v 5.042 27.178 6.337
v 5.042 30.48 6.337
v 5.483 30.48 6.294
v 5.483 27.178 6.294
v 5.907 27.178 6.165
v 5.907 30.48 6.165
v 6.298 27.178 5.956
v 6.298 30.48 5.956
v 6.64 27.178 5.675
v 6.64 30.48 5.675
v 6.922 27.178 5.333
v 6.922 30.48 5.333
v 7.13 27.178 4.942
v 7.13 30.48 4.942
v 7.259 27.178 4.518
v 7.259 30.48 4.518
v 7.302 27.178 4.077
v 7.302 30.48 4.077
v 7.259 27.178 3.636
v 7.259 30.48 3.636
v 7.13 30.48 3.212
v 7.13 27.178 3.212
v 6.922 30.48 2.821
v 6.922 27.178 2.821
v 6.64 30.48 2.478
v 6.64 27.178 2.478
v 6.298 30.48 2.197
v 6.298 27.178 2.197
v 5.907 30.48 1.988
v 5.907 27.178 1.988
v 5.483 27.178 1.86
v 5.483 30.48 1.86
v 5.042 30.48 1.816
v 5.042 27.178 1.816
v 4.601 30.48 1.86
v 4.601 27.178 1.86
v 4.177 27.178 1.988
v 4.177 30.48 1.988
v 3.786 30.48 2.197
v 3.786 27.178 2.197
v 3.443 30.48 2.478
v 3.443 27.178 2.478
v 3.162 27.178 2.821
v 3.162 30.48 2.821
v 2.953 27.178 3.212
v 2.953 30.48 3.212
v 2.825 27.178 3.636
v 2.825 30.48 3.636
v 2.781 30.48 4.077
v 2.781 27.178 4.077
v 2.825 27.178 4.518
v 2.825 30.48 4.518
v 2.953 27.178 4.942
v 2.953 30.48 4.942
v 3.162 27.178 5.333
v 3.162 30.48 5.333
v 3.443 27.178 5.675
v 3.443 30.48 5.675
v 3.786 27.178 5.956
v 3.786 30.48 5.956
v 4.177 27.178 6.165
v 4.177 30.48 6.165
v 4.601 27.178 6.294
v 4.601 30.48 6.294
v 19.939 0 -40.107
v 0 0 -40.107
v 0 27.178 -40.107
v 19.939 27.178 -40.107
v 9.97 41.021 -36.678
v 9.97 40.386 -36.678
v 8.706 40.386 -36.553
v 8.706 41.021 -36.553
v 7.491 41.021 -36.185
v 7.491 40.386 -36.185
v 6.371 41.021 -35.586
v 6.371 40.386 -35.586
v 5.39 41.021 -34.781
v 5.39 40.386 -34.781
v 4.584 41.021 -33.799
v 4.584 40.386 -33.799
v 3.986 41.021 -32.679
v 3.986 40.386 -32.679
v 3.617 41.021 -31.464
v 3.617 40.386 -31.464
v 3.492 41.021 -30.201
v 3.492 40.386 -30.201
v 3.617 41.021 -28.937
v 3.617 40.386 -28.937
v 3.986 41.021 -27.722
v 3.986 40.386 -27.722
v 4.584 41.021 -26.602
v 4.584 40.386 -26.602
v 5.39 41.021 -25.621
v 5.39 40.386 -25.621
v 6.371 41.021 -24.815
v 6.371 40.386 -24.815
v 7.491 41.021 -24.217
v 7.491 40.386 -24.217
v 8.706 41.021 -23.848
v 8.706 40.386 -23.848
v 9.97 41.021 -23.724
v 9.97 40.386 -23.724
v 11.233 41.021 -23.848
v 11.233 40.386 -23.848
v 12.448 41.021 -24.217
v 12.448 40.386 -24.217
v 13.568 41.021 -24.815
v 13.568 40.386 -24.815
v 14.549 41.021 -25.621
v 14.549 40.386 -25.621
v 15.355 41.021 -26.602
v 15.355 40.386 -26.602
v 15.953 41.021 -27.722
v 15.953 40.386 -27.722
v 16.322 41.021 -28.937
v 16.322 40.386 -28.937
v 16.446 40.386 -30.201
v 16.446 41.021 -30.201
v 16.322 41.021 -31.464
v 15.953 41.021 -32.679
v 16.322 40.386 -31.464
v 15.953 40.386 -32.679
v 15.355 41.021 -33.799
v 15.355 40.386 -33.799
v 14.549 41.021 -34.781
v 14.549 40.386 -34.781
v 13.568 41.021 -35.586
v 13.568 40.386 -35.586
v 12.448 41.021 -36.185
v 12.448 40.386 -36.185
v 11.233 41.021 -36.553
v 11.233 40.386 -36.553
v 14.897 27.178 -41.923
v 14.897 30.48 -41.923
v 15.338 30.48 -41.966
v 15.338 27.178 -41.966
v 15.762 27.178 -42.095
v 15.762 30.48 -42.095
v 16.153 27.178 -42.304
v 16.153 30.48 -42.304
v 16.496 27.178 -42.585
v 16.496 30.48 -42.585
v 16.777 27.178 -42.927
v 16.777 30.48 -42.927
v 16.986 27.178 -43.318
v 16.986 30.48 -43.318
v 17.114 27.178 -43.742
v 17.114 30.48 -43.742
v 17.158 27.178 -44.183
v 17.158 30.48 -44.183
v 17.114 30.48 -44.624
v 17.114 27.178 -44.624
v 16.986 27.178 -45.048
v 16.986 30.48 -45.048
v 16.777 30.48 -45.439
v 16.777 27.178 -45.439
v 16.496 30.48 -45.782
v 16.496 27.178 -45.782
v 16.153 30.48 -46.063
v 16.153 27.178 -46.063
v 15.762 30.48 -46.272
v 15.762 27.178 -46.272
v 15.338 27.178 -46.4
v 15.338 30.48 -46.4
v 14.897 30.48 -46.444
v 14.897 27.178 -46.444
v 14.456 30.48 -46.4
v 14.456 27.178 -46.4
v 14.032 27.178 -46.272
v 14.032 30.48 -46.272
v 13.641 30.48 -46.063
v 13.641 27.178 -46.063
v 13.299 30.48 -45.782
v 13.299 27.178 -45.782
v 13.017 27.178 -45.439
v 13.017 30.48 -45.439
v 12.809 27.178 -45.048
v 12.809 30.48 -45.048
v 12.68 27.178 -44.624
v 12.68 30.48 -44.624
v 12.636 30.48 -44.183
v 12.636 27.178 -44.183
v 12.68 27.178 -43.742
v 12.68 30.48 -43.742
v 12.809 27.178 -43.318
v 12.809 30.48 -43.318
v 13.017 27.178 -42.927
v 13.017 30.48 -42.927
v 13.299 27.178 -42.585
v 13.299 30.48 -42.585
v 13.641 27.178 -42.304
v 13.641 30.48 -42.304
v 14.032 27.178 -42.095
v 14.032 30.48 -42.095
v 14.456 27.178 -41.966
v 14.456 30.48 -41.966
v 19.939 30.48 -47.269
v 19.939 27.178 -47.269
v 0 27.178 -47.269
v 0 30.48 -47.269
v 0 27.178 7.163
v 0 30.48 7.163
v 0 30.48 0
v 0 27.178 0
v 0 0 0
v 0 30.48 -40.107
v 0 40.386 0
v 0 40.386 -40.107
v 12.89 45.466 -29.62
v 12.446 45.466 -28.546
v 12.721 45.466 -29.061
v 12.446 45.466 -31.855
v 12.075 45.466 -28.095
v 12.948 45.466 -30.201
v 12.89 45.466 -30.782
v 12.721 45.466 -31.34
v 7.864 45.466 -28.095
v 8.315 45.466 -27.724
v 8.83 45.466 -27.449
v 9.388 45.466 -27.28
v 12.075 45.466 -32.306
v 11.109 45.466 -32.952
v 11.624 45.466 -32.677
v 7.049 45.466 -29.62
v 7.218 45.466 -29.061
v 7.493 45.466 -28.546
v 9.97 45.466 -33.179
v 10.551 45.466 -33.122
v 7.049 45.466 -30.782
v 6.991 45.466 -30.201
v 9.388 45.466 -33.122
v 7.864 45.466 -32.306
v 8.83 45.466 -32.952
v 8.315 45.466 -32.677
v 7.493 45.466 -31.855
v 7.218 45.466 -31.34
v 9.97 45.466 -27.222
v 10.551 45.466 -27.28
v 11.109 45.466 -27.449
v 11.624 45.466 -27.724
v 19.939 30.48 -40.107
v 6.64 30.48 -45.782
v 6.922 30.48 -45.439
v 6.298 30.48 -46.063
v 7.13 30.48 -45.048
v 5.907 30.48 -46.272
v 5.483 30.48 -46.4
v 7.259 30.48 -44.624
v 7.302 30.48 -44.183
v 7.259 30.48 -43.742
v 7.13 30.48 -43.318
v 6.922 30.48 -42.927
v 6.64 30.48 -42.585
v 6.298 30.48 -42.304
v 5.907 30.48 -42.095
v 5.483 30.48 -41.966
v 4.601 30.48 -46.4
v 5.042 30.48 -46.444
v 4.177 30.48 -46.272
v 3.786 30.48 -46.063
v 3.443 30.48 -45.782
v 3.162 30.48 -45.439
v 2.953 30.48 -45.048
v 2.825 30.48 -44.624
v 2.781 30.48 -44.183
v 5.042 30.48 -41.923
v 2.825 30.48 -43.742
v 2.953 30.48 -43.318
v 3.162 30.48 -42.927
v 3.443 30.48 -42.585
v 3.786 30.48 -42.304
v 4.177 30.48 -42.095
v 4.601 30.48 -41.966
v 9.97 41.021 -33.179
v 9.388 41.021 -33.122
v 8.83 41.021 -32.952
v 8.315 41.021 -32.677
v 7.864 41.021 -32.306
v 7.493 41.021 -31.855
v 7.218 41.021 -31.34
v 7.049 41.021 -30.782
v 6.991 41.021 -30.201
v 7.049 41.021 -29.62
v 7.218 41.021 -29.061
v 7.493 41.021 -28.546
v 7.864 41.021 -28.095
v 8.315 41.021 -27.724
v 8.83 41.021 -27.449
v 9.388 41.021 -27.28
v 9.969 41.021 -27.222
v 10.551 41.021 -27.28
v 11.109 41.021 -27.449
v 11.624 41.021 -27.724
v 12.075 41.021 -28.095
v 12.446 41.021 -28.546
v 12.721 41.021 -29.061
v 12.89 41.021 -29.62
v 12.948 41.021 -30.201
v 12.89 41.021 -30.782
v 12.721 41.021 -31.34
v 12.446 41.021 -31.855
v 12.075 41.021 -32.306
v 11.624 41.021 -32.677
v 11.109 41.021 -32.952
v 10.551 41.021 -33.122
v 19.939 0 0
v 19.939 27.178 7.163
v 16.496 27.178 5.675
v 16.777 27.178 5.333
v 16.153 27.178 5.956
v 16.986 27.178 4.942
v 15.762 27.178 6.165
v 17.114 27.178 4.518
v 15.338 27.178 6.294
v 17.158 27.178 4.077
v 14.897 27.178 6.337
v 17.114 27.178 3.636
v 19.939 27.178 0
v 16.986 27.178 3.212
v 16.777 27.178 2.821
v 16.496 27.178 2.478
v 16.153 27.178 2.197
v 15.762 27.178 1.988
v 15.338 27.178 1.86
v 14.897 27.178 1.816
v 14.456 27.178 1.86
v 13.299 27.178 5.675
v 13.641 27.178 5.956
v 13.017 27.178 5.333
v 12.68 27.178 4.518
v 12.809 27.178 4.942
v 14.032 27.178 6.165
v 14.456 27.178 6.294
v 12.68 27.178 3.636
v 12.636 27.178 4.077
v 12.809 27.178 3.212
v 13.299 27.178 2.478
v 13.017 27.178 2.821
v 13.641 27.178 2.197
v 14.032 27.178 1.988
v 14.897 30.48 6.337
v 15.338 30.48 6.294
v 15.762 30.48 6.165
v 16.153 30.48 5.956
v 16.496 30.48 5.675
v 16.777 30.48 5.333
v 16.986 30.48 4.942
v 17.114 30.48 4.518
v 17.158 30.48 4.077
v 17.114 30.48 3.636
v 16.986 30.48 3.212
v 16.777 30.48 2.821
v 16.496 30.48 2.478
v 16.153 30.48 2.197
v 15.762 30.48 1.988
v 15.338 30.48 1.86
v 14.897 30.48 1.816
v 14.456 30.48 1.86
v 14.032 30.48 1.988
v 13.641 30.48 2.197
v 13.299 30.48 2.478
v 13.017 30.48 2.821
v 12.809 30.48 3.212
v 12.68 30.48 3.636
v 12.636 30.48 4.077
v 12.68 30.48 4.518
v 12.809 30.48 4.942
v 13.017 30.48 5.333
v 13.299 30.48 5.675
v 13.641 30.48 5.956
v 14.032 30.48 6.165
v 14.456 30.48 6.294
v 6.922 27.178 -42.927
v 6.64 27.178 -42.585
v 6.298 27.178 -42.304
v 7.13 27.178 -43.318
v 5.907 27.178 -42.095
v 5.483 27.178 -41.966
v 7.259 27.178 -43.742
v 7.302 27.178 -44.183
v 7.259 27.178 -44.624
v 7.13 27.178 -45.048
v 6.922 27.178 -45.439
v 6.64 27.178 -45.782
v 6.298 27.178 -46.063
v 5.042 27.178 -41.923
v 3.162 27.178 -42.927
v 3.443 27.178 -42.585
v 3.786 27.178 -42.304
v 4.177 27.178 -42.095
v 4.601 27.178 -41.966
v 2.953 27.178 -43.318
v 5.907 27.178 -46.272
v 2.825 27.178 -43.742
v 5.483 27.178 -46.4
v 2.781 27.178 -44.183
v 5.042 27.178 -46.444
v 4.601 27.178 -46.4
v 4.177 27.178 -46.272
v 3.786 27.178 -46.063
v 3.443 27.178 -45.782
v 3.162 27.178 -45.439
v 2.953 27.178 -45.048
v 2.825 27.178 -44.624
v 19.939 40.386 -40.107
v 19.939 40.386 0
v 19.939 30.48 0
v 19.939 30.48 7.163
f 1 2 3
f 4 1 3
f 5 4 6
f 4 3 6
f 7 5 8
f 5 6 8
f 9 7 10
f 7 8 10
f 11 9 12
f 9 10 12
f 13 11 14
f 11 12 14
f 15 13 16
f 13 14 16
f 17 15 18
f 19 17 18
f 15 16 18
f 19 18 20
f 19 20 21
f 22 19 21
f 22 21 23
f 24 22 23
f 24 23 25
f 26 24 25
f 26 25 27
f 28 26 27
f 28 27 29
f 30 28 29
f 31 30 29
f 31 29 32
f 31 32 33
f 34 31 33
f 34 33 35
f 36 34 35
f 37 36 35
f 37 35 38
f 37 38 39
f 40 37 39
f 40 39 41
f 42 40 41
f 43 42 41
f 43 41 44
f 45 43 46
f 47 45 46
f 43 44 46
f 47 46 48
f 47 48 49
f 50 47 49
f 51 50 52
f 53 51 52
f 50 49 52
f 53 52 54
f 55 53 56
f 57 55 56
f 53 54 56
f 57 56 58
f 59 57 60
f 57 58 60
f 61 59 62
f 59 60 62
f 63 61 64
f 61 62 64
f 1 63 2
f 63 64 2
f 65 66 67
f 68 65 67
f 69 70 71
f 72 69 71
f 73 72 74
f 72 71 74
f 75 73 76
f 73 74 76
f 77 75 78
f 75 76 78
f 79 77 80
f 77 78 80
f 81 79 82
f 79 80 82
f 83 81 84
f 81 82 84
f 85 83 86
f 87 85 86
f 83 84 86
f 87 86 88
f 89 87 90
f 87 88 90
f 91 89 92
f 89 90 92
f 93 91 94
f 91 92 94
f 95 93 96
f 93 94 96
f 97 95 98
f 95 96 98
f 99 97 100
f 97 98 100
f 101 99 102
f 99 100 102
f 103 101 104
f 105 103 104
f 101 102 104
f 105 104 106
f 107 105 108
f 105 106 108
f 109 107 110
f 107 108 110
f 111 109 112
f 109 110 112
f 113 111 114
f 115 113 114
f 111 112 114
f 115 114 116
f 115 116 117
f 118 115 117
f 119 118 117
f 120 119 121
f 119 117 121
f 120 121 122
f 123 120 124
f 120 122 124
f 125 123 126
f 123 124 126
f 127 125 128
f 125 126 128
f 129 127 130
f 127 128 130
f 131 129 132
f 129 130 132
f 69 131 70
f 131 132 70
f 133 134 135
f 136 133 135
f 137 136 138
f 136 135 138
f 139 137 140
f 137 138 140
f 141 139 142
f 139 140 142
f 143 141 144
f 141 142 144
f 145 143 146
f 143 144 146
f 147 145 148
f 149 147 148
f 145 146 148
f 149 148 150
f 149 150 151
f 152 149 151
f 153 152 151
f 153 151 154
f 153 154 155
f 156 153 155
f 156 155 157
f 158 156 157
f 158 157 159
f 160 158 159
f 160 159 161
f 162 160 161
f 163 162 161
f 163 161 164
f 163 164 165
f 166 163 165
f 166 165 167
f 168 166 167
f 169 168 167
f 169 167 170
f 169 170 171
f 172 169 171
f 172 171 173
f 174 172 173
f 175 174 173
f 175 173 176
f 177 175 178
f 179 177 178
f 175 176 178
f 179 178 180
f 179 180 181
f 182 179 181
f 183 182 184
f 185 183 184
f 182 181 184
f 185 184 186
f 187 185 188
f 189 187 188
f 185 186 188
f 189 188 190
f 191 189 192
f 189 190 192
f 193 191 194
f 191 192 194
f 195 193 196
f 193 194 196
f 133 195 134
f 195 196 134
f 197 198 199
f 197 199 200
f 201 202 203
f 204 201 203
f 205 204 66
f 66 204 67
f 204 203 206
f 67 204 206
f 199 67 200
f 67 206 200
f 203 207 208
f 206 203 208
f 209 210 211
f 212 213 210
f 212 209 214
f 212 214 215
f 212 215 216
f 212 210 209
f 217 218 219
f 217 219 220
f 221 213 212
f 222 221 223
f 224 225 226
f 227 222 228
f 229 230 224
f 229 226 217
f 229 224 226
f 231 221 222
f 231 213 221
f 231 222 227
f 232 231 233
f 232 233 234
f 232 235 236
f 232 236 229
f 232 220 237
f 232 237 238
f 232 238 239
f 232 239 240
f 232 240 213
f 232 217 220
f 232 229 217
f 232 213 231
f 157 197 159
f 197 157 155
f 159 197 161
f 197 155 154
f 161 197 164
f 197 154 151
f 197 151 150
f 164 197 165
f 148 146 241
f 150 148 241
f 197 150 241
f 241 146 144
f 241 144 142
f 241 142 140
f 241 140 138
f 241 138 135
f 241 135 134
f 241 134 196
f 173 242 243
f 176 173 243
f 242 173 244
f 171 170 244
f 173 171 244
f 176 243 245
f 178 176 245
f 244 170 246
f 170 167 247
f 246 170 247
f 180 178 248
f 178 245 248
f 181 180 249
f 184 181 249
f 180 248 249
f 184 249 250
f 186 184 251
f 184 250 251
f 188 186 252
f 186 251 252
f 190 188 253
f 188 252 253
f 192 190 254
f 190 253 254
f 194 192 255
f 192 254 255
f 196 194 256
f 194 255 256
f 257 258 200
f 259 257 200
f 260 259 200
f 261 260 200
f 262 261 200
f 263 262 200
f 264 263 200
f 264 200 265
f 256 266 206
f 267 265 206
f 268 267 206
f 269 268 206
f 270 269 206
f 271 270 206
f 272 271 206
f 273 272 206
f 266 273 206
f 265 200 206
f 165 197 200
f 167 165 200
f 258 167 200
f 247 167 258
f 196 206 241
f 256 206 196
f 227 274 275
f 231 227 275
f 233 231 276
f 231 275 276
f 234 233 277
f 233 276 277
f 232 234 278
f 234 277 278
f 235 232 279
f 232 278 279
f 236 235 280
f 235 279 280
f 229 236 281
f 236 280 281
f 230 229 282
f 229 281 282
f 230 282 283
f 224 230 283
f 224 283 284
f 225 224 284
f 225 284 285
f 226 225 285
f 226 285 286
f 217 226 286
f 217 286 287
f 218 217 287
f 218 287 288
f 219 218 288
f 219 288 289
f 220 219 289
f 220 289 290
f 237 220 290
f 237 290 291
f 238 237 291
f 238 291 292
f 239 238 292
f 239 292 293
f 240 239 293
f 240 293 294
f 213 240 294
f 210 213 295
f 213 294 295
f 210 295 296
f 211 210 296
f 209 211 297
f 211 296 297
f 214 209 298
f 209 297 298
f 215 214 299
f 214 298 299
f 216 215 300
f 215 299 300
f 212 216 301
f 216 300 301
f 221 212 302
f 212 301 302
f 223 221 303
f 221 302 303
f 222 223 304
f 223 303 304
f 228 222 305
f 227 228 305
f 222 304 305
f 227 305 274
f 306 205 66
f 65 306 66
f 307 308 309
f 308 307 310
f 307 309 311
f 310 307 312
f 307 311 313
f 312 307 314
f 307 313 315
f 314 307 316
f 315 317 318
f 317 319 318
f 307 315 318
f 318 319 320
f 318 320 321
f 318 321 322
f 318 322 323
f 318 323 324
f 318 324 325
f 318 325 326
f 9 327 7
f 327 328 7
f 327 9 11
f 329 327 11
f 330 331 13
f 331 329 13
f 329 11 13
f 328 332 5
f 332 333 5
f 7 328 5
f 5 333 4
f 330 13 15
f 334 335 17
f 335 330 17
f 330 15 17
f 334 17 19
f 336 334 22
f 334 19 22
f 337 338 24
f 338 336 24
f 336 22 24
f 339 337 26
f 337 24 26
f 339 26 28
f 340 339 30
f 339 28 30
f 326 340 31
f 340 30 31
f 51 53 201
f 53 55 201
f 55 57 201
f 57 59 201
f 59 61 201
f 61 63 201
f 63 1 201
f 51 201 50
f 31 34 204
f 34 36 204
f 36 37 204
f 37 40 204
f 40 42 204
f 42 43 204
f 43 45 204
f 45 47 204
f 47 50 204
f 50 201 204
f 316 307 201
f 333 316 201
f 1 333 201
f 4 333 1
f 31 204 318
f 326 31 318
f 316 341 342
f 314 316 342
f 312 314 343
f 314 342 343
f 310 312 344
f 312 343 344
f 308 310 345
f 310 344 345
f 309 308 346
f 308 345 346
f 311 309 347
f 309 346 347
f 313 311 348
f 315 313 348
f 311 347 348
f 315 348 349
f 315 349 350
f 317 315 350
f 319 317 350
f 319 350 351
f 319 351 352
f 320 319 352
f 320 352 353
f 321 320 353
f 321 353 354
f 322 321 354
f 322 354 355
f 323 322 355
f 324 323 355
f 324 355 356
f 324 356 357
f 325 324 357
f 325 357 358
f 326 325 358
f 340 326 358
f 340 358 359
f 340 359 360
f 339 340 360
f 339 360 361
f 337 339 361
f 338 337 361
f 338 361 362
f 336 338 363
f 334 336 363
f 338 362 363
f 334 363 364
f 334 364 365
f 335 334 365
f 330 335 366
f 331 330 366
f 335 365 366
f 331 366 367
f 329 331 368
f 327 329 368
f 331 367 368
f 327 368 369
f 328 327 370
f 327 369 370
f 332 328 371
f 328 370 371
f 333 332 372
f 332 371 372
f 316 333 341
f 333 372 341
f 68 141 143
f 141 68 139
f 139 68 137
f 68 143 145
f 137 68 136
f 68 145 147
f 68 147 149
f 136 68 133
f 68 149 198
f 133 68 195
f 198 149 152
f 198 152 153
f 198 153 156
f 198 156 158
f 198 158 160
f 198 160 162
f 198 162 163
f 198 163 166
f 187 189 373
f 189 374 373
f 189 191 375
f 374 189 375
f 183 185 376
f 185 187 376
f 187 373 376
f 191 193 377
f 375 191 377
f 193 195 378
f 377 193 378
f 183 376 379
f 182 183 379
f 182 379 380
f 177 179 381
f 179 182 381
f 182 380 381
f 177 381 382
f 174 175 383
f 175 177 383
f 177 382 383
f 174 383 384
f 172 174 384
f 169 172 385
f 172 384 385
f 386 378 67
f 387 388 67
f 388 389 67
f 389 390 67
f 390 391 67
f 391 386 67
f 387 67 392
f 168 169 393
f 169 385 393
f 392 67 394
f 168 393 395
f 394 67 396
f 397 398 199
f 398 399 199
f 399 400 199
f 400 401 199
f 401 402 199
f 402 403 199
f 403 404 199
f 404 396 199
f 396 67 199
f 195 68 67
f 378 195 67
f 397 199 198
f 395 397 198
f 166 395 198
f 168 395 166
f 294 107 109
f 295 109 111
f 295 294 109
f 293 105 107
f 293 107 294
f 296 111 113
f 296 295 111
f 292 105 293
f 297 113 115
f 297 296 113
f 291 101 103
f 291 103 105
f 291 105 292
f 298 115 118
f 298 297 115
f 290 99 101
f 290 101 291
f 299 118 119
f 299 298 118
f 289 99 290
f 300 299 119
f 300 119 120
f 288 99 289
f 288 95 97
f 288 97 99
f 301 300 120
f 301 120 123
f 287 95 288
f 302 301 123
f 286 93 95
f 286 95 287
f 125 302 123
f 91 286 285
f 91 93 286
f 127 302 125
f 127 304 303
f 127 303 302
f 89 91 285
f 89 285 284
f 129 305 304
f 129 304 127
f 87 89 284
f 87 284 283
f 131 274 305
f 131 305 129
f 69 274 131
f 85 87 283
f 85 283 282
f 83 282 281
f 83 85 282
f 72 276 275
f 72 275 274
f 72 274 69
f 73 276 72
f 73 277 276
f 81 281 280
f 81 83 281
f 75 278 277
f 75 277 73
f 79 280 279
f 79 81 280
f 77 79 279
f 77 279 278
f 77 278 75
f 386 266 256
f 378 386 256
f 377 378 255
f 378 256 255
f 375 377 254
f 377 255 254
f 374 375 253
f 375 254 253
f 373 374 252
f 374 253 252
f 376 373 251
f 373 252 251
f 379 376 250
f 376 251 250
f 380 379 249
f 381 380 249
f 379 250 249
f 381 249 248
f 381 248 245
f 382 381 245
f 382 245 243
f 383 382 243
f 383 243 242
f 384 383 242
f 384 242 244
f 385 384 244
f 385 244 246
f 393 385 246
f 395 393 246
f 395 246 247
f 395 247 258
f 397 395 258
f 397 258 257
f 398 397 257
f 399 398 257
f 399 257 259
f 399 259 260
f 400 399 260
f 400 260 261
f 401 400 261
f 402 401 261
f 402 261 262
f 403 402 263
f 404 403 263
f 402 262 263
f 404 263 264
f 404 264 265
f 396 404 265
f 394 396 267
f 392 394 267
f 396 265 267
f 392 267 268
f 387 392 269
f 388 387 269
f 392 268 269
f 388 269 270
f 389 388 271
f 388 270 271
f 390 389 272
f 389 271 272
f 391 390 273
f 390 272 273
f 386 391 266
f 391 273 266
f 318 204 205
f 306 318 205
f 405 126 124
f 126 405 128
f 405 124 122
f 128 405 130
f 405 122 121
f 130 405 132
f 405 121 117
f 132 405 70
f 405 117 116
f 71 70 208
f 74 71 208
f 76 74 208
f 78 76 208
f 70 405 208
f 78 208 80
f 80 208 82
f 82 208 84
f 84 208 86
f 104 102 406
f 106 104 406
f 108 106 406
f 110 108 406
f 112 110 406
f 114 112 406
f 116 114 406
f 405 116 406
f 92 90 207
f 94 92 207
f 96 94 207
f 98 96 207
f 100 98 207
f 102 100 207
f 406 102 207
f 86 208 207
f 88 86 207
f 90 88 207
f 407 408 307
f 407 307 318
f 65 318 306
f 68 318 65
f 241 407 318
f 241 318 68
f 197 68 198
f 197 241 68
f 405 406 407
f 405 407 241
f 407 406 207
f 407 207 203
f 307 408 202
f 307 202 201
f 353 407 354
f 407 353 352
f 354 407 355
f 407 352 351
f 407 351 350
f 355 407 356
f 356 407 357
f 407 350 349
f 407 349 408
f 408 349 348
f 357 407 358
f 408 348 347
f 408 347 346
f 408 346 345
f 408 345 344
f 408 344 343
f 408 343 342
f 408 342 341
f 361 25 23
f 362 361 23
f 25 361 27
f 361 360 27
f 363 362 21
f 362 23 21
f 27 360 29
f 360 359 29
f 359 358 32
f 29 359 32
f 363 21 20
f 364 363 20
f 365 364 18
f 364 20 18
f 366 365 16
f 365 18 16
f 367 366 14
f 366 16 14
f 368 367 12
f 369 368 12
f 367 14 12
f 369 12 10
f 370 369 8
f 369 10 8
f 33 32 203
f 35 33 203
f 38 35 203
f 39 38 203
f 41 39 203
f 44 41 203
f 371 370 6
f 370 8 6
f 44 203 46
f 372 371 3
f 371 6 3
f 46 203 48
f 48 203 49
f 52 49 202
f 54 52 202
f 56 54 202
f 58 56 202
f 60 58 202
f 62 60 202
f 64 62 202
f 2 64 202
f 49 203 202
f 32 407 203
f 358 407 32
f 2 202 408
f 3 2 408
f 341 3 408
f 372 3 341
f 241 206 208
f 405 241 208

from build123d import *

# Parameters (mm, degrees)
BOSS_EXTRUDE1_DEPTH = 19.939
SKETCH2_R           = 2.97815
BOSS_EXTRUDE2_DEPTH = 5.08
SKETCH3_R           = 6.477
BOSS_EXTRUDE3_DEPTH = 0.635
SKETCH4_R           = 2.2606
CUT_EXTRUDE1_DEPTH  = 60.674033694


with BuildPart() as part:
    # Sketch1 → Boss-Extrude1 (new body)
    with BuildSketch(Plane(origin=(0, 0, 0), x_dir=(0, 0, -1), z_dir=(1, 0, 0))):
        Polygon((0, 0), (40.1066, 0), (40.1066, 27.178), (47.2694, 27.178), (47.2694, 30.48), (40.1066, 30.48), (40.1066, 40.386), (0, 40.386), (0, 30.48), (-7.1628, 30.48), (-7.1628, 27.178), (0, 27.178), align=None)
    extrude(amount=BOSS_EXTRUDE1_DEPTH)

    # Sketch2 → Boss-Extrude2 (add)
    with BuildSketch(Plane(origin=(0, 40.386, 0), x_dir=(1, 0, 0), z_dir=(0, 1, 0))):
        with Locations((9.9695, 30.2006)):
            Circle(SKETCH2_R)
    extrude(amount=BOSS_EXTRUDE2_DEPTH)

    # Sketch3 → Boss-Extrude3 (add)
    with BuildSketch(Plane(origin=(0, 40.386, 0), x_dir=(1, 0, 0), z_dir=(0, 1, 0))):
        with Locations((9.9695, 30.2006)):
            Circle(SKETCH3_R)
    extrude(amount=BOSS_EXTRUDE3_DEPTH)

    # Sketch4 → Cut-Extrude1 (cut, through all)
    with BuildSketch(Plane(origin=(0, 30.48, 0), x_dir=(1, 0, 0), z_dir=(0, 1, 0))):
        with Locations((5.0419, 44.1833)):
            Circle(SKETCH4_R)
        with Locations((14.8971, 44.1833)):
            Circle(SKETCH4_R)
        with Locations((14.8971, -4.0767)):
            Circle(SKETCH4_R)
        with Locations((5.0419, -4.0767)):
            Circle(SKETCH4_R)
    extrude(amount=-CUT_EXTRUDE1_DEPTH, mode=Mode.SUBTRACT)


solid = part.part
